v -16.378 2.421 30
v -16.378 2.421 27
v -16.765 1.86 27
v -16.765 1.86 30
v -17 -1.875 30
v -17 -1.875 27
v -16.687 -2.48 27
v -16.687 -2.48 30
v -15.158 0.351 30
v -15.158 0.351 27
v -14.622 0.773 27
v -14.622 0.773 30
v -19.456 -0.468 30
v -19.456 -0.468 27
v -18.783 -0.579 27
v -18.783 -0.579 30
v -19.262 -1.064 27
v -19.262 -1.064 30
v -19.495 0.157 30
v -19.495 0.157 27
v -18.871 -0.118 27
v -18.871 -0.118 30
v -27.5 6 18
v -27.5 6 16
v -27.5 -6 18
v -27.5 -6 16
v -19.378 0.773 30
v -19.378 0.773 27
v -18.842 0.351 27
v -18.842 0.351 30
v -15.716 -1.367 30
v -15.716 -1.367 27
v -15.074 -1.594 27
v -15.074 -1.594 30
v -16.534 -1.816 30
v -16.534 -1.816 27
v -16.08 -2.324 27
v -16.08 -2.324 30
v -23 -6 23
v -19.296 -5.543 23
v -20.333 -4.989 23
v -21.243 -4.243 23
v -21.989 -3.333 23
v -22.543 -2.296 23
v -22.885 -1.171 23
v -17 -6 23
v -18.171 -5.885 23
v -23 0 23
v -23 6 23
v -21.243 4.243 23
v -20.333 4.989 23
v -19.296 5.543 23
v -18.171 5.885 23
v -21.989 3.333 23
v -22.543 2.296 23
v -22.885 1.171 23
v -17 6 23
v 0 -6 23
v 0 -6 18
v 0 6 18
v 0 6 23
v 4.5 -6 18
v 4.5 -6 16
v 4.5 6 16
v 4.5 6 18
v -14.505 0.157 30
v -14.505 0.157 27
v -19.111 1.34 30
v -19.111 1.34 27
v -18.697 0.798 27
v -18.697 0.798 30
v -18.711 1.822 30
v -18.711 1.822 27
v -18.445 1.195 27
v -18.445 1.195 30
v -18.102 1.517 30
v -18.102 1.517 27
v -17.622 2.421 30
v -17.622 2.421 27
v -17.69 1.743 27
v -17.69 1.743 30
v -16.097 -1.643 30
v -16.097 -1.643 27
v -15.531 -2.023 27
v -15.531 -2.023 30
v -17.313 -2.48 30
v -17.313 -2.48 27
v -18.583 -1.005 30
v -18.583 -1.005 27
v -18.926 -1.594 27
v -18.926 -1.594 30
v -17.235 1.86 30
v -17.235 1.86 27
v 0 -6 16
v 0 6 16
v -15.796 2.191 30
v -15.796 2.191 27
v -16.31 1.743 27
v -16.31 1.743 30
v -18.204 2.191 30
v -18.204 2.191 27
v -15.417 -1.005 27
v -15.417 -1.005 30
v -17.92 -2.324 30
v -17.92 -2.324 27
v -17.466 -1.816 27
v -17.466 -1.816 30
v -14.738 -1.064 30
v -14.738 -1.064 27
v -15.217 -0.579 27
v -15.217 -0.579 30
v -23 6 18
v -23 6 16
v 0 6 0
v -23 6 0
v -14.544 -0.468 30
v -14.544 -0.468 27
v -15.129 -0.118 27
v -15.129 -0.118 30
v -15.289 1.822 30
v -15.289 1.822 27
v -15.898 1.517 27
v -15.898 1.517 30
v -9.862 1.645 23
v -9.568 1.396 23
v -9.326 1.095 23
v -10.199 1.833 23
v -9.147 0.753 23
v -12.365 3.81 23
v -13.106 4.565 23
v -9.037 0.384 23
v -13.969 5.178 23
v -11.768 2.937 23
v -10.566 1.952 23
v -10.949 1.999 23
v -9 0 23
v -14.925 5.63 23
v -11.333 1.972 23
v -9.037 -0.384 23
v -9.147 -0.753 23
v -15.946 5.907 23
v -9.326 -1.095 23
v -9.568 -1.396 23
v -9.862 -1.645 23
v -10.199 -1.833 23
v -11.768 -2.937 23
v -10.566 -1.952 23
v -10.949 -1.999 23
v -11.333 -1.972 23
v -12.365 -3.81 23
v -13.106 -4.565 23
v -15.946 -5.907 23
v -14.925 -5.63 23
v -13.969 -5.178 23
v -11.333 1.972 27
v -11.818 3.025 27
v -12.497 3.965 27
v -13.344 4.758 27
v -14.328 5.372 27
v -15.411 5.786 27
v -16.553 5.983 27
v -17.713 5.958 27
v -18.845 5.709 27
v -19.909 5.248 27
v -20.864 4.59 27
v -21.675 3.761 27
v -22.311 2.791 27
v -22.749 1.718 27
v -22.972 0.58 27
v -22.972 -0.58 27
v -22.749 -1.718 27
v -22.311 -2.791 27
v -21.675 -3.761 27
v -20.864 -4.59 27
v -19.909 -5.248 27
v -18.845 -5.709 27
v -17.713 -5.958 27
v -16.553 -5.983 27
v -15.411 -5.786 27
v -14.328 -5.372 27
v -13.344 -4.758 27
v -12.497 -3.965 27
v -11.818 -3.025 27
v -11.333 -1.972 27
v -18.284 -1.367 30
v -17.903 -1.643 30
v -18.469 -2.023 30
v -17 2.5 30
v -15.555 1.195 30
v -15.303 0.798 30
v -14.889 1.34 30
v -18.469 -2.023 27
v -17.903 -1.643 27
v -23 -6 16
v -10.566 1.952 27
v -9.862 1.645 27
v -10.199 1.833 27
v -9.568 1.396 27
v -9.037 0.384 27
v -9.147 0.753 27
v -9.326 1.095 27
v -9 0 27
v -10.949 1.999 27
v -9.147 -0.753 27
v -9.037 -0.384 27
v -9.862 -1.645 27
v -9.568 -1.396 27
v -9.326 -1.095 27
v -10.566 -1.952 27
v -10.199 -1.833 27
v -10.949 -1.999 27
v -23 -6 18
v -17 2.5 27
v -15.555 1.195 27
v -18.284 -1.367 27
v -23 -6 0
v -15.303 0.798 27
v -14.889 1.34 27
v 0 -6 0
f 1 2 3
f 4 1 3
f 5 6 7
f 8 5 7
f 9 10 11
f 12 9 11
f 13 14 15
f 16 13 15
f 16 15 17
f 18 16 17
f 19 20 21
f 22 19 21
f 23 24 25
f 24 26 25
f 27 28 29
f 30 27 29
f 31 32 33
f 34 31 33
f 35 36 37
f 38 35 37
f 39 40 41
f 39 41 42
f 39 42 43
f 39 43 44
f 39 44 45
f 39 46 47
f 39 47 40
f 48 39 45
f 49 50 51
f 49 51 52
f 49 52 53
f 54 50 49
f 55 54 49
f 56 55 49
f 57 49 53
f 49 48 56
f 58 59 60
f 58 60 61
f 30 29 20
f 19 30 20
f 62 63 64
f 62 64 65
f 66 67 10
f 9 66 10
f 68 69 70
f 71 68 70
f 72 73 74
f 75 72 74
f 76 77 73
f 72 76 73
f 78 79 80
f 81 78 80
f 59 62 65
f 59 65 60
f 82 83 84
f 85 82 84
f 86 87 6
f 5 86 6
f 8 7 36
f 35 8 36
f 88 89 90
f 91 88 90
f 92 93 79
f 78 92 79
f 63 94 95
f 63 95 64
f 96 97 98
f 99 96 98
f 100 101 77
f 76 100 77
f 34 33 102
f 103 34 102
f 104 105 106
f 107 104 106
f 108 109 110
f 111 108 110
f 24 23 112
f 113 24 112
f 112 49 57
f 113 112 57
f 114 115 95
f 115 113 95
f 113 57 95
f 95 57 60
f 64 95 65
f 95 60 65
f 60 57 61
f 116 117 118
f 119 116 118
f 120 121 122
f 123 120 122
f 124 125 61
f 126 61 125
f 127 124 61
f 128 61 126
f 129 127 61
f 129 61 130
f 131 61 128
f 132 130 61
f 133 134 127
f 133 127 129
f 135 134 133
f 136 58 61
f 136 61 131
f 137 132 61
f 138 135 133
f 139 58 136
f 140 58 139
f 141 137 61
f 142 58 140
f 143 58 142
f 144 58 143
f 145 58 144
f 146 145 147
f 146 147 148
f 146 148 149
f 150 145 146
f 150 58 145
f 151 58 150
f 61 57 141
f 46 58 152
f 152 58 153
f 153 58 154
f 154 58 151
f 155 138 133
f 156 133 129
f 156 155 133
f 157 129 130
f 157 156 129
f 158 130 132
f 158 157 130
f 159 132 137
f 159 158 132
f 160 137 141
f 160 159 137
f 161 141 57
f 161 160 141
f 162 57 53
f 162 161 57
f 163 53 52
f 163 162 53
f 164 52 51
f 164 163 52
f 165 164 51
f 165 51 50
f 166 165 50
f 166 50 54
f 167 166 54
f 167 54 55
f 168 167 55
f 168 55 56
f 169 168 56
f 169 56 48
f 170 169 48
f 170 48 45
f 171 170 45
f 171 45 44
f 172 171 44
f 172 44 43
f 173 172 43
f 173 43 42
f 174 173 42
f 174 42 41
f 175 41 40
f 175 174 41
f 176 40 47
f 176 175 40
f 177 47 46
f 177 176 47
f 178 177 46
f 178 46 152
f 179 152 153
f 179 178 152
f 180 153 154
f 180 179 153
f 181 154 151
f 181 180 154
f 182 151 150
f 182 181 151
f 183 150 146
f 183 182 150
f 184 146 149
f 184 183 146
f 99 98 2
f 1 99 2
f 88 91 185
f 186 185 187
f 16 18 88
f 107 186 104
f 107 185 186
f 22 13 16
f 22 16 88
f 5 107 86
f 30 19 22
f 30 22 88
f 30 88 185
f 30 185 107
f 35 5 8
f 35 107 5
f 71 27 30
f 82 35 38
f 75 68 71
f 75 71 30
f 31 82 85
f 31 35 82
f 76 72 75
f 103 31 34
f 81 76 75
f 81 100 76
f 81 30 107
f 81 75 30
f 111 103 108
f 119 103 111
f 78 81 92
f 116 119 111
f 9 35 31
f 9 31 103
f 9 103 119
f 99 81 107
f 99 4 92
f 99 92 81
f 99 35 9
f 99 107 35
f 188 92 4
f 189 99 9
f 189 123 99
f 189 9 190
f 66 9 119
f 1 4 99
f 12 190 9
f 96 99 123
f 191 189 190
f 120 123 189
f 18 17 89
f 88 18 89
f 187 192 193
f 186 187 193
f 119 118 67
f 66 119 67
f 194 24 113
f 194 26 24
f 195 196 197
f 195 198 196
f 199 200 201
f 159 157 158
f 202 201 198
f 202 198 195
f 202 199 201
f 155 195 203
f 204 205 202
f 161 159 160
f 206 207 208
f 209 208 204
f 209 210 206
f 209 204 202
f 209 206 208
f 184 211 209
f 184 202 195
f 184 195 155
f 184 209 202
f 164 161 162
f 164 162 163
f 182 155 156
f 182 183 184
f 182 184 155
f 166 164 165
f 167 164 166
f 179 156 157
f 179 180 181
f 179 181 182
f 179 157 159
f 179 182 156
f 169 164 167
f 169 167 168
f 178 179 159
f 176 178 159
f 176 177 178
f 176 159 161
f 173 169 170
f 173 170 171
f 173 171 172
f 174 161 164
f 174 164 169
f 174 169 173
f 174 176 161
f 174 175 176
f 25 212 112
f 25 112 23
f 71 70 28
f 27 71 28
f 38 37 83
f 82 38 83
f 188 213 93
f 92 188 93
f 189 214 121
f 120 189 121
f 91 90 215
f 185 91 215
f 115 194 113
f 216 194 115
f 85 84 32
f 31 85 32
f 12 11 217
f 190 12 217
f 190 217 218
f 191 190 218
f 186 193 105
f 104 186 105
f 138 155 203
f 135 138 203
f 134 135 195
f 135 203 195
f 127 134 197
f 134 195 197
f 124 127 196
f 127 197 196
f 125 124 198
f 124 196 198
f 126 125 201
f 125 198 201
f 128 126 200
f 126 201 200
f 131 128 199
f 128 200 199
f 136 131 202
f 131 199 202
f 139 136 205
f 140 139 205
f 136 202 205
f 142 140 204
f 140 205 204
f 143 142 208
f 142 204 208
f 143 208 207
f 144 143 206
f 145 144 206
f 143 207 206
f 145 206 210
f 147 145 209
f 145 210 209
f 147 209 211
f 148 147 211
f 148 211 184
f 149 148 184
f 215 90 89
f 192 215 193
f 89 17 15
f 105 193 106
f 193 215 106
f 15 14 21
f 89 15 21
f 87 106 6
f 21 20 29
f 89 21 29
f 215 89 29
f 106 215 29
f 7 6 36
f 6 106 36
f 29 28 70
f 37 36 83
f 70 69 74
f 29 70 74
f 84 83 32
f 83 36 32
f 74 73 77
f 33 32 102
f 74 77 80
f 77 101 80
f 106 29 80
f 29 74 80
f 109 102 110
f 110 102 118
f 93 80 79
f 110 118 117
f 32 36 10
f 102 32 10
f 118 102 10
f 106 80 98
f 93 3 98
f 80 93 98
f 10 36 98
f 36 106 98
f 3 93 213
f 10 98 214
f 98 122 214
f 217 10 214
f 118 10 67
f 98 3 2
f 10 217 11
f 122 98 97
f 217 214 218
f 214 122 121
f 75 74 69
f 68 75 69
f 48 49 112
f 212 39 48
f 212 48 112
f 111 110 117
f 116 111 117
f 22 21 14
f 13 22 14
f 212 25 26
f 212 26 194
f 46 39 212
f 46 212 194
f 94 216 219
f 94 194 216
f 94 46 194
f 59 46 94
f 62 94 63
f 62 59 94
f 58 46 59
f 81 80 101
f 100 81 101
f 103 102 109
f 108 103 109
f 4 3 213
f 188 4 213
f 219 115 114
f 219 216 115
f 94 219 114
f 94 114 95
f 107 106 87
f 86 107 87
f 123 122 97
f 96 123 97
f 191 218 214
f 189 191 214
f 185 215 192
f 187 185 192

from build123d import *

# Parameters (mm, degrees)
F0_W     = 6
F0_H     = 4
F0_W_2   = 2
F0_W_3   = 23
F0_H_2   = 16
F0_H_3   = 2
F0_W_4   = 4.5
F3_DEPTH = 6
F5_START = 27
F5_DEPTH = 3


with BuildPart() as f1:
    # F0 (on Front) → F1 (revolve)
    with BuildSketch(Plane.XZ):
        with Locations((-20, 25)):
            Rectangle(F0_W, F0_H)
    revolve(axis=Axis((-17, 0, 25), (0, 0, 1)))

    # F0 (on Front) → F2 (revolve)
    with BuildSketch(Plane.XZ):
        with Locations((-10, 25)):
            Rectangle(F0_W_2, F0_H)
    revolve(axis=Axis((-11, 0, 25), (0, 0, -1)))

    # F0 (on Front) → F3 (join, symmetric)
    with BuildSketch(Plane.XZ):
        with Locations((-11.5, 8)):
            Rectangle(F0_W_3, F0_H_2)
        with Locations((-11.5, 17)):
            Rectangle(F0_W_3, F0_H_3)
        with Locations((2.25, 17)):
            Rectangle(F0_W_4, F0_H_3)
        with Locations((-25.25, 17)):
            Rectangle(F0_W_4, F0_H_3)
        Polygon((-23, 18), (0, 18), (0, 23), (-9, 23), (-11, 23), (-17, 23), (-23, 23), align=None)
    extrude(amount=F3_DEPTH, both=True)


with BuildPart() as f5:
    # F4 (on Top) → F5 (new body)
    with BuildSketch(Plane.XY.offset(F5_START)):
        Polygon((-15.1286998842, -0.1177322241), (-15.1582114049, 0.3513399648), (-15.3034492766, 0.7983361717), (-15.5552876698, 1.1951699808), (-15.897902652, 1.5169068645), (-16.3097664637, 1.743330911), (-16.7650001871, 1.860215065), (-17.2349998129, 1.860215065), (-17.6902335363, 1.743330911), (-18.102097348, 1.5169068645), (-18.4447123302, 1.1951699808), (-18.6965507234, 0.7983361717), (-18.8417885951, 0.3513399648), (-18.8713001158, -0.1177322241), (-18.7832309681, -0.5794068645), (-18.5831148603, -1.0046752406), (-18.2835258236, -1.3668161764), (-17.9032881389, -1.6430750251), (-17.4662935384, -1.8160934271), (-17, -1.875), (-16.5337064616, -1.8160934271), (-16.0967118611, -1.6430750251), (-15.7164741764, -1.3668161764), (-15.4168851397, -1.0046752406), (-15.2167690319, -0.5794068645), align=None)
        Polygon((-18.4447123302, 1.1951699808), (-19.1108198138, 1.3395669874), (-18.6965507234, 0.7983361717), align=None)
        Polygon((-18.6965507234, 0.7983361717), (-19.3776412907, 0.7725424859), (-18.8417885951, 0.3513399648), align=None)
        Polygon((-18.8417885951, 0.3513399648), (-19.4950668211, 0.1569762988), (-18.8713001158, -0.1177322241), align=None)
        Polygon((-18.8713001158, -0.1177322241), (-19.4557181268, -0.4684532865), (-18.7832309681, -0.5794068645), align=None)
        Polygon((-18.7832309681, -0.5794068645), (-19.2620676312, -1.0644482289), (-18.5831148603, -1.0046752406), align=None)
        Polygon((-18.5831148603, -1.0046752406), (-18.9262831069, -1.5935599744), (-18.2835258236, -1.3668161764), align=None)
        Polygon((-18.2835258236, -1.3668161764), (-18.4694631307, -2.0225424859), (-17.9032881389, -1.6430750251), align=None)
        Polygon((-17.9032881389, -1.6430750251), (-17.9203113817, -2.3244412147), (-17.4662935384, -1.8160934271), align=None)
        Polygon((-17.4662935384, -1.8160934271), (-17.3133330839, -2.4802867533), (-17, -1.875), align=None)
        Polygon((-17, -1.875), (-16.6866669161, -2.4802867533), (-16.5337064616, -1.8160934271), align=None)
        Polygon((-16.5337064616, -1.8160934271), (-16.0796886183, -2.3244412147), (-16.0967118611, -1.6430750251), align=None)
        Polygon((-16.0967118611, -1.6430750251), (-15.5305368693, -2.0225424859), (-15.7164741764, -1.3668161764), align=None)
        Polygon((-15.7164741764, -1.3668161764), (-15.0737168931, -1.5935599744), (-15.4168851397, -1.0046752406), align=None)
        Polygon((-15.4168851397, -1.0046752406), (-14.7379323688, -1.0644482289), (-15.2167690319, -0.5794068645), align=None)
        Polygon((-15.2167690319, -0.5794068645), (-14.5442818732, -0.4684532865), (-15.1286998842, -0.1177322241), align=None)
        Polygon((-15.1286998842, -0.1177322241), (-14.5049331789, 0.1569762988), (-15.1582114049, 0.3513399648), align=None)
        Polygon((-15.5552876698, 1.1951699808), (-15.2886322352, 1.8224215686), (-15.897902652, 1.5169068645), align=None)
        Polygon((-15.3034492766, 0.7983361717), (-14.8891801862, 1.3395669874), (-15.5552876698, 1.1951699808), align=None)
        Polygon((-15.1582114049, 0.3513399648), (-14.6223587093, 0.7725424859), (-15.3034492766, 0.7983361717), align=None)
        Polygon((-18.102097348, 1.5169068645), (-18.7113677648, 1.8224215686), (-18.4447123302, 1.1951699808), align=None)
        Polygon((-17.6902335363, 1.743330911), (-18.2043841853, 2.1907667001), (-18.102097348, 1.5169068645), align=None)
        Polygon((-17.2349998129, 1.860215065), (-17.6217247179, 2.4214579028), (-17.6902335363, 1.743330911), align=None)
        Polygon((-16.7650001871, 1.860215065), (-17, 2.5), (-17.2349998129, 1.860215065), align=None)
        Polygon((-16.3097664637, 1.743330911), (-16.3782752821, 2.4214579028), (-16.7650001871, 1.860215065), align=None)
        Polygon((-15.897902652, 1.5169068645), (-15.7956158147, 2.1907667001), (-16.3097664637, 1.743330911), align=None)
    extrude(amount=F5_DEPTH)


solid = Compound([f1.part, f5.part])
